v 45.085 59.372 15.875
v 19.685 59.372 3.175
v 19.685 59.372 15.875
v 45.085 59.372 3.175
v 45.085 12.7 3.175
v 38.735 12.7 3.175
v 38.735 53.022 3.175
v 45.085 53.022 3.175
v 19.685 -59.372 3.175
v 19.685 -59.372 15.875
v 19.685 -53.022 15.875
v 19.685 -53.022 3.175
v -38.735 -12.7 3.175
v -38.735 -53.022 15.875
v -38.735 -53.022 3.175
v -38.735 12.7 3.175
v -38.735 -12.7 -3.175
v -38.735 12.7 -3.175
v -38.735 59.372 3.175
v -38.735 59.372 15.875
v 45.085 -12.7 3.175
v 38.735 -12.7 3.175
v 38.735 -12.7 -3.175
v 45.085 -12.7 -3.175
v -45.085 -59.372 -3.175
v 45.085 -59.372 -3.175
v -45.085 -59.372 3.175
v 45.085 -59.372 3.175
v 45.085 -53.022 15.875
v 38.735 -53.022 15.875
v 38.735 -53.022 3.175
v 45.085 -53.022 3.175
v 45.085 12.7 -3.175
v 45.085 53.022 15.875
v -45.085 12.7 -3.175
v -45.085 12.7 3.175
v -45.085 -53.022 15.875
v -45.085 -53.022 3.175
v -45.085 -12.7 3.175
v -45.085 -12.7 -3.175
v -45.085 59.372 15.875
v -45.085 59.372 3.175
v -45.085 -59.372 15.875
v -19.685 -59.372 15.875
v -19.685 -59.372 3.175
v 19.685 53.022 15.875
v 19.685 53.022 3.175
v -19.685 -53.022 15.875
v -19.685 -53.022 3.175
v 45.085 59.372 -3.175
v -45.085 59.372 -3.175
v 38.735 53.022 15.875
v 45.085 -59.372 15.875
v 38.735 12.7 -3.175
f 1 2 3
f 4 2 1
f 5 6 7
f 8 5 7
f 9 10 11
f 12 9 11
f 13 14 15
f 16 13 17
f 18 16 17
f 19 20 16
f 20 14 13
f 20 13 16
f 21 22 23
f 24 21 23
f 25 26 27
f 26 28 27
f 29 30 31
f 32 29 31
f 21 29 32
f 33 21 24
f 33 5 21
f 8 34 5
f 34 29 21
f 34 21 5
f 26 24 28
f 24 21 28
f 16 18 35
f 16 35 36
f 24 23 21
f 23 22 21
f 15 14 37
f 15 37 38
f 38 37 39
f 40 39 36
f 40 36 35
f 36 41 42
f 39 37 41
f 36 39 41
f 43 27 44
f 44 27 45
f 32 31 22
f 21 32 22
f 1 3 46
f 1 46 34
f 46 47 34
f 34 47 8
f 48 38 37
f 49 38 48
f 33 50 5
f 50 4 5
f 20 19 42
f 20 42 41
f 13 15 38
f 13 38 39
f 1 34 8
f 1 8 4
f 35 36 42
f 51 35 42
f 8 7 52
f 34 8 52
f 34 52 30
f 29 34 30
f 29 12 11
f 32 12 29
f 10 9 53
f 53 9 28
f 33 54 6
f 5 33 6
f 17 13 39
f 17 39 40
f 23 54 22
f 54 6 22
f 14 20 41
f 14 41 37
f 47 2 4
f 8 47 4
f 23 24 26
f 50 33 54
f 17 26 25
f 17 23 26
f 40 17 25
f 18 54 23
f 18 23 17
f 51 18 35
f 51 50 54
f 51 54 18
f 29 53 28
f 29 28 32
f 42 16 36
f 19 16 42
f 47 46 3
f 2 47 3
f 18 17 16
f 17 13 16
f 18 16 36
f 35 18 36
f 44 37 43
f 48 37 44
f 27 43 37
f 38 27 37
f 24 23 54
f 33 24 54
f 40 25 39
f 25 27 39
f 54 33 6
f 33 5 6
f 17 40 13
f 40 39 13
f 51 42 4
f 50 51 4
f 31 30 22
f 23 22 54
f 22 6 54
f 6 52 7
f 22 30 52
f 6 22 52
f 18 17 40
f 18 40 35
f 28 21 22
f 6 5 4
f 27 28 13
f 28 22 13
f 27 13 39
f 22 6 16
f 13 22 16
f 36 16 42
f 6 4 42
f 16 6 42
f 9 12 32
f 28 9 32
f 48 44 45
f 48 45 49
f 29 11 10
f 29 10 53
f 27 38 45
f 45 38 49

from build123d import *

# Parameters (mm, degrees)
BOSS_EXTRU_1_DEPTH   = 3.175
ESQUISSE2_W          = 25.4
ESQUISSE2_H          = 6.35
BOSS_EXTRU_2_DEPTH   = 12.7
ESQUISSE3_W          = 25.4
ESQUISSE3_H          = 6.35
BOSS_EXTRU_3_DEPTH   = 12.7
BOSS_EXTRU_3_2_DEPTH = 12.7
BOSS_EXTRU_4_DEPTH   = 6.35
BOSS_EXTRU_5_DEPTH   = 6.35


with BuildPart() as part:
    # Esquisse1 → Boss.-Extru.1 (new, symmetric)
    with BuildSketch(Plane.XY):
        Polygon((-45.085, 59.3725), (45.085, 59.3725), (45.085, 12.7), (38.735, 12.7), (38.735, -12.7), (45.085, -12.7), (45.085, -59.3725), (-45.085, -59.3725), (-45.085, -12.7), (-38.735, -12.7), (-38.735, 12.7), (-45.085, 12.7), align=None)
    extrude(amount=BOSS_EXTRU_1_DEPTH, both=True)


with BuildPart() as body_2:
    # Esquisse2 → Boss.-Extru.2 (new body)
    with BuildSketch(Plane.XY.offset(3.175)):
        with Locations((32.385, 56.1975)):
            Rectangle(ESQUISSE2_W, ESQUISSE2_H)
    extrude(amount=BOSS_EXTRU_2_DEPTH)


with BuildPart() as body_3:
    # Esquisse3 → Boss.-Extru.3 (new body)
    with BuildSketch(Plane.XY.offset(3.175)):
        with Locations((-32.385, -56.1975)):
            Rectangle(ESQUISSE3_W, ESQUISSE3_H)
    extrude(amount=BOSS_EXTRU_3_DEPTH)


with BuildPart() as body_4:
    # Esquisse3 → Boss.-Extru.3 2 (new body)
    with BuildSketch(Plane.XY.offset(3.175)):
        with Locations((32.385, -56.1975)):
            Rectangle(ESQUISSE3_W, ESQUISSE3_H)
    extrude(amount=BOSS_EXTRU_3_2_DEPTH)


with BuildPart() as body_5:
    # Esquisse5 → Boss.-Extru.4 (new body)
    with BuildSketch(Plane(origin=(38.735, 0, 0), x_dir=(0, 0, -1), z_dir=(1, 0, 0))):
        Polygon((3.175, 12.7), (-3.175, 12.7), (-3.175, 53.0225), (-15.875, 53.0225), (-15.875, -53.0225), (-3.175, -53.0225), (-3.175, -12.7), (3.175, -12.7), align=None)
    extrude(amount=BOSS_EXTRU_4_DEPTH)


with BuildPart() as body_6:
    # Esquisse6 → Boss.-Extru.5 (new body)
    with BuildSketch(Plane.ZY.offset(38.735)):
        Polygon((-3.175, 12.7), (3.175, 12.7), (3.175, 59.3725), (15.875, 59.3725), (15.875, -53.0225), (3.175, -53.0225), (3.175, -12.7), (-3.175, -12.7), align=None)
    extrude(amount=BOSS_EXTRU_5_DEPTH)


solid = Compound([part.part, body_2.part, body_3.part, body_4.part, body_5.part, body_6.part])
